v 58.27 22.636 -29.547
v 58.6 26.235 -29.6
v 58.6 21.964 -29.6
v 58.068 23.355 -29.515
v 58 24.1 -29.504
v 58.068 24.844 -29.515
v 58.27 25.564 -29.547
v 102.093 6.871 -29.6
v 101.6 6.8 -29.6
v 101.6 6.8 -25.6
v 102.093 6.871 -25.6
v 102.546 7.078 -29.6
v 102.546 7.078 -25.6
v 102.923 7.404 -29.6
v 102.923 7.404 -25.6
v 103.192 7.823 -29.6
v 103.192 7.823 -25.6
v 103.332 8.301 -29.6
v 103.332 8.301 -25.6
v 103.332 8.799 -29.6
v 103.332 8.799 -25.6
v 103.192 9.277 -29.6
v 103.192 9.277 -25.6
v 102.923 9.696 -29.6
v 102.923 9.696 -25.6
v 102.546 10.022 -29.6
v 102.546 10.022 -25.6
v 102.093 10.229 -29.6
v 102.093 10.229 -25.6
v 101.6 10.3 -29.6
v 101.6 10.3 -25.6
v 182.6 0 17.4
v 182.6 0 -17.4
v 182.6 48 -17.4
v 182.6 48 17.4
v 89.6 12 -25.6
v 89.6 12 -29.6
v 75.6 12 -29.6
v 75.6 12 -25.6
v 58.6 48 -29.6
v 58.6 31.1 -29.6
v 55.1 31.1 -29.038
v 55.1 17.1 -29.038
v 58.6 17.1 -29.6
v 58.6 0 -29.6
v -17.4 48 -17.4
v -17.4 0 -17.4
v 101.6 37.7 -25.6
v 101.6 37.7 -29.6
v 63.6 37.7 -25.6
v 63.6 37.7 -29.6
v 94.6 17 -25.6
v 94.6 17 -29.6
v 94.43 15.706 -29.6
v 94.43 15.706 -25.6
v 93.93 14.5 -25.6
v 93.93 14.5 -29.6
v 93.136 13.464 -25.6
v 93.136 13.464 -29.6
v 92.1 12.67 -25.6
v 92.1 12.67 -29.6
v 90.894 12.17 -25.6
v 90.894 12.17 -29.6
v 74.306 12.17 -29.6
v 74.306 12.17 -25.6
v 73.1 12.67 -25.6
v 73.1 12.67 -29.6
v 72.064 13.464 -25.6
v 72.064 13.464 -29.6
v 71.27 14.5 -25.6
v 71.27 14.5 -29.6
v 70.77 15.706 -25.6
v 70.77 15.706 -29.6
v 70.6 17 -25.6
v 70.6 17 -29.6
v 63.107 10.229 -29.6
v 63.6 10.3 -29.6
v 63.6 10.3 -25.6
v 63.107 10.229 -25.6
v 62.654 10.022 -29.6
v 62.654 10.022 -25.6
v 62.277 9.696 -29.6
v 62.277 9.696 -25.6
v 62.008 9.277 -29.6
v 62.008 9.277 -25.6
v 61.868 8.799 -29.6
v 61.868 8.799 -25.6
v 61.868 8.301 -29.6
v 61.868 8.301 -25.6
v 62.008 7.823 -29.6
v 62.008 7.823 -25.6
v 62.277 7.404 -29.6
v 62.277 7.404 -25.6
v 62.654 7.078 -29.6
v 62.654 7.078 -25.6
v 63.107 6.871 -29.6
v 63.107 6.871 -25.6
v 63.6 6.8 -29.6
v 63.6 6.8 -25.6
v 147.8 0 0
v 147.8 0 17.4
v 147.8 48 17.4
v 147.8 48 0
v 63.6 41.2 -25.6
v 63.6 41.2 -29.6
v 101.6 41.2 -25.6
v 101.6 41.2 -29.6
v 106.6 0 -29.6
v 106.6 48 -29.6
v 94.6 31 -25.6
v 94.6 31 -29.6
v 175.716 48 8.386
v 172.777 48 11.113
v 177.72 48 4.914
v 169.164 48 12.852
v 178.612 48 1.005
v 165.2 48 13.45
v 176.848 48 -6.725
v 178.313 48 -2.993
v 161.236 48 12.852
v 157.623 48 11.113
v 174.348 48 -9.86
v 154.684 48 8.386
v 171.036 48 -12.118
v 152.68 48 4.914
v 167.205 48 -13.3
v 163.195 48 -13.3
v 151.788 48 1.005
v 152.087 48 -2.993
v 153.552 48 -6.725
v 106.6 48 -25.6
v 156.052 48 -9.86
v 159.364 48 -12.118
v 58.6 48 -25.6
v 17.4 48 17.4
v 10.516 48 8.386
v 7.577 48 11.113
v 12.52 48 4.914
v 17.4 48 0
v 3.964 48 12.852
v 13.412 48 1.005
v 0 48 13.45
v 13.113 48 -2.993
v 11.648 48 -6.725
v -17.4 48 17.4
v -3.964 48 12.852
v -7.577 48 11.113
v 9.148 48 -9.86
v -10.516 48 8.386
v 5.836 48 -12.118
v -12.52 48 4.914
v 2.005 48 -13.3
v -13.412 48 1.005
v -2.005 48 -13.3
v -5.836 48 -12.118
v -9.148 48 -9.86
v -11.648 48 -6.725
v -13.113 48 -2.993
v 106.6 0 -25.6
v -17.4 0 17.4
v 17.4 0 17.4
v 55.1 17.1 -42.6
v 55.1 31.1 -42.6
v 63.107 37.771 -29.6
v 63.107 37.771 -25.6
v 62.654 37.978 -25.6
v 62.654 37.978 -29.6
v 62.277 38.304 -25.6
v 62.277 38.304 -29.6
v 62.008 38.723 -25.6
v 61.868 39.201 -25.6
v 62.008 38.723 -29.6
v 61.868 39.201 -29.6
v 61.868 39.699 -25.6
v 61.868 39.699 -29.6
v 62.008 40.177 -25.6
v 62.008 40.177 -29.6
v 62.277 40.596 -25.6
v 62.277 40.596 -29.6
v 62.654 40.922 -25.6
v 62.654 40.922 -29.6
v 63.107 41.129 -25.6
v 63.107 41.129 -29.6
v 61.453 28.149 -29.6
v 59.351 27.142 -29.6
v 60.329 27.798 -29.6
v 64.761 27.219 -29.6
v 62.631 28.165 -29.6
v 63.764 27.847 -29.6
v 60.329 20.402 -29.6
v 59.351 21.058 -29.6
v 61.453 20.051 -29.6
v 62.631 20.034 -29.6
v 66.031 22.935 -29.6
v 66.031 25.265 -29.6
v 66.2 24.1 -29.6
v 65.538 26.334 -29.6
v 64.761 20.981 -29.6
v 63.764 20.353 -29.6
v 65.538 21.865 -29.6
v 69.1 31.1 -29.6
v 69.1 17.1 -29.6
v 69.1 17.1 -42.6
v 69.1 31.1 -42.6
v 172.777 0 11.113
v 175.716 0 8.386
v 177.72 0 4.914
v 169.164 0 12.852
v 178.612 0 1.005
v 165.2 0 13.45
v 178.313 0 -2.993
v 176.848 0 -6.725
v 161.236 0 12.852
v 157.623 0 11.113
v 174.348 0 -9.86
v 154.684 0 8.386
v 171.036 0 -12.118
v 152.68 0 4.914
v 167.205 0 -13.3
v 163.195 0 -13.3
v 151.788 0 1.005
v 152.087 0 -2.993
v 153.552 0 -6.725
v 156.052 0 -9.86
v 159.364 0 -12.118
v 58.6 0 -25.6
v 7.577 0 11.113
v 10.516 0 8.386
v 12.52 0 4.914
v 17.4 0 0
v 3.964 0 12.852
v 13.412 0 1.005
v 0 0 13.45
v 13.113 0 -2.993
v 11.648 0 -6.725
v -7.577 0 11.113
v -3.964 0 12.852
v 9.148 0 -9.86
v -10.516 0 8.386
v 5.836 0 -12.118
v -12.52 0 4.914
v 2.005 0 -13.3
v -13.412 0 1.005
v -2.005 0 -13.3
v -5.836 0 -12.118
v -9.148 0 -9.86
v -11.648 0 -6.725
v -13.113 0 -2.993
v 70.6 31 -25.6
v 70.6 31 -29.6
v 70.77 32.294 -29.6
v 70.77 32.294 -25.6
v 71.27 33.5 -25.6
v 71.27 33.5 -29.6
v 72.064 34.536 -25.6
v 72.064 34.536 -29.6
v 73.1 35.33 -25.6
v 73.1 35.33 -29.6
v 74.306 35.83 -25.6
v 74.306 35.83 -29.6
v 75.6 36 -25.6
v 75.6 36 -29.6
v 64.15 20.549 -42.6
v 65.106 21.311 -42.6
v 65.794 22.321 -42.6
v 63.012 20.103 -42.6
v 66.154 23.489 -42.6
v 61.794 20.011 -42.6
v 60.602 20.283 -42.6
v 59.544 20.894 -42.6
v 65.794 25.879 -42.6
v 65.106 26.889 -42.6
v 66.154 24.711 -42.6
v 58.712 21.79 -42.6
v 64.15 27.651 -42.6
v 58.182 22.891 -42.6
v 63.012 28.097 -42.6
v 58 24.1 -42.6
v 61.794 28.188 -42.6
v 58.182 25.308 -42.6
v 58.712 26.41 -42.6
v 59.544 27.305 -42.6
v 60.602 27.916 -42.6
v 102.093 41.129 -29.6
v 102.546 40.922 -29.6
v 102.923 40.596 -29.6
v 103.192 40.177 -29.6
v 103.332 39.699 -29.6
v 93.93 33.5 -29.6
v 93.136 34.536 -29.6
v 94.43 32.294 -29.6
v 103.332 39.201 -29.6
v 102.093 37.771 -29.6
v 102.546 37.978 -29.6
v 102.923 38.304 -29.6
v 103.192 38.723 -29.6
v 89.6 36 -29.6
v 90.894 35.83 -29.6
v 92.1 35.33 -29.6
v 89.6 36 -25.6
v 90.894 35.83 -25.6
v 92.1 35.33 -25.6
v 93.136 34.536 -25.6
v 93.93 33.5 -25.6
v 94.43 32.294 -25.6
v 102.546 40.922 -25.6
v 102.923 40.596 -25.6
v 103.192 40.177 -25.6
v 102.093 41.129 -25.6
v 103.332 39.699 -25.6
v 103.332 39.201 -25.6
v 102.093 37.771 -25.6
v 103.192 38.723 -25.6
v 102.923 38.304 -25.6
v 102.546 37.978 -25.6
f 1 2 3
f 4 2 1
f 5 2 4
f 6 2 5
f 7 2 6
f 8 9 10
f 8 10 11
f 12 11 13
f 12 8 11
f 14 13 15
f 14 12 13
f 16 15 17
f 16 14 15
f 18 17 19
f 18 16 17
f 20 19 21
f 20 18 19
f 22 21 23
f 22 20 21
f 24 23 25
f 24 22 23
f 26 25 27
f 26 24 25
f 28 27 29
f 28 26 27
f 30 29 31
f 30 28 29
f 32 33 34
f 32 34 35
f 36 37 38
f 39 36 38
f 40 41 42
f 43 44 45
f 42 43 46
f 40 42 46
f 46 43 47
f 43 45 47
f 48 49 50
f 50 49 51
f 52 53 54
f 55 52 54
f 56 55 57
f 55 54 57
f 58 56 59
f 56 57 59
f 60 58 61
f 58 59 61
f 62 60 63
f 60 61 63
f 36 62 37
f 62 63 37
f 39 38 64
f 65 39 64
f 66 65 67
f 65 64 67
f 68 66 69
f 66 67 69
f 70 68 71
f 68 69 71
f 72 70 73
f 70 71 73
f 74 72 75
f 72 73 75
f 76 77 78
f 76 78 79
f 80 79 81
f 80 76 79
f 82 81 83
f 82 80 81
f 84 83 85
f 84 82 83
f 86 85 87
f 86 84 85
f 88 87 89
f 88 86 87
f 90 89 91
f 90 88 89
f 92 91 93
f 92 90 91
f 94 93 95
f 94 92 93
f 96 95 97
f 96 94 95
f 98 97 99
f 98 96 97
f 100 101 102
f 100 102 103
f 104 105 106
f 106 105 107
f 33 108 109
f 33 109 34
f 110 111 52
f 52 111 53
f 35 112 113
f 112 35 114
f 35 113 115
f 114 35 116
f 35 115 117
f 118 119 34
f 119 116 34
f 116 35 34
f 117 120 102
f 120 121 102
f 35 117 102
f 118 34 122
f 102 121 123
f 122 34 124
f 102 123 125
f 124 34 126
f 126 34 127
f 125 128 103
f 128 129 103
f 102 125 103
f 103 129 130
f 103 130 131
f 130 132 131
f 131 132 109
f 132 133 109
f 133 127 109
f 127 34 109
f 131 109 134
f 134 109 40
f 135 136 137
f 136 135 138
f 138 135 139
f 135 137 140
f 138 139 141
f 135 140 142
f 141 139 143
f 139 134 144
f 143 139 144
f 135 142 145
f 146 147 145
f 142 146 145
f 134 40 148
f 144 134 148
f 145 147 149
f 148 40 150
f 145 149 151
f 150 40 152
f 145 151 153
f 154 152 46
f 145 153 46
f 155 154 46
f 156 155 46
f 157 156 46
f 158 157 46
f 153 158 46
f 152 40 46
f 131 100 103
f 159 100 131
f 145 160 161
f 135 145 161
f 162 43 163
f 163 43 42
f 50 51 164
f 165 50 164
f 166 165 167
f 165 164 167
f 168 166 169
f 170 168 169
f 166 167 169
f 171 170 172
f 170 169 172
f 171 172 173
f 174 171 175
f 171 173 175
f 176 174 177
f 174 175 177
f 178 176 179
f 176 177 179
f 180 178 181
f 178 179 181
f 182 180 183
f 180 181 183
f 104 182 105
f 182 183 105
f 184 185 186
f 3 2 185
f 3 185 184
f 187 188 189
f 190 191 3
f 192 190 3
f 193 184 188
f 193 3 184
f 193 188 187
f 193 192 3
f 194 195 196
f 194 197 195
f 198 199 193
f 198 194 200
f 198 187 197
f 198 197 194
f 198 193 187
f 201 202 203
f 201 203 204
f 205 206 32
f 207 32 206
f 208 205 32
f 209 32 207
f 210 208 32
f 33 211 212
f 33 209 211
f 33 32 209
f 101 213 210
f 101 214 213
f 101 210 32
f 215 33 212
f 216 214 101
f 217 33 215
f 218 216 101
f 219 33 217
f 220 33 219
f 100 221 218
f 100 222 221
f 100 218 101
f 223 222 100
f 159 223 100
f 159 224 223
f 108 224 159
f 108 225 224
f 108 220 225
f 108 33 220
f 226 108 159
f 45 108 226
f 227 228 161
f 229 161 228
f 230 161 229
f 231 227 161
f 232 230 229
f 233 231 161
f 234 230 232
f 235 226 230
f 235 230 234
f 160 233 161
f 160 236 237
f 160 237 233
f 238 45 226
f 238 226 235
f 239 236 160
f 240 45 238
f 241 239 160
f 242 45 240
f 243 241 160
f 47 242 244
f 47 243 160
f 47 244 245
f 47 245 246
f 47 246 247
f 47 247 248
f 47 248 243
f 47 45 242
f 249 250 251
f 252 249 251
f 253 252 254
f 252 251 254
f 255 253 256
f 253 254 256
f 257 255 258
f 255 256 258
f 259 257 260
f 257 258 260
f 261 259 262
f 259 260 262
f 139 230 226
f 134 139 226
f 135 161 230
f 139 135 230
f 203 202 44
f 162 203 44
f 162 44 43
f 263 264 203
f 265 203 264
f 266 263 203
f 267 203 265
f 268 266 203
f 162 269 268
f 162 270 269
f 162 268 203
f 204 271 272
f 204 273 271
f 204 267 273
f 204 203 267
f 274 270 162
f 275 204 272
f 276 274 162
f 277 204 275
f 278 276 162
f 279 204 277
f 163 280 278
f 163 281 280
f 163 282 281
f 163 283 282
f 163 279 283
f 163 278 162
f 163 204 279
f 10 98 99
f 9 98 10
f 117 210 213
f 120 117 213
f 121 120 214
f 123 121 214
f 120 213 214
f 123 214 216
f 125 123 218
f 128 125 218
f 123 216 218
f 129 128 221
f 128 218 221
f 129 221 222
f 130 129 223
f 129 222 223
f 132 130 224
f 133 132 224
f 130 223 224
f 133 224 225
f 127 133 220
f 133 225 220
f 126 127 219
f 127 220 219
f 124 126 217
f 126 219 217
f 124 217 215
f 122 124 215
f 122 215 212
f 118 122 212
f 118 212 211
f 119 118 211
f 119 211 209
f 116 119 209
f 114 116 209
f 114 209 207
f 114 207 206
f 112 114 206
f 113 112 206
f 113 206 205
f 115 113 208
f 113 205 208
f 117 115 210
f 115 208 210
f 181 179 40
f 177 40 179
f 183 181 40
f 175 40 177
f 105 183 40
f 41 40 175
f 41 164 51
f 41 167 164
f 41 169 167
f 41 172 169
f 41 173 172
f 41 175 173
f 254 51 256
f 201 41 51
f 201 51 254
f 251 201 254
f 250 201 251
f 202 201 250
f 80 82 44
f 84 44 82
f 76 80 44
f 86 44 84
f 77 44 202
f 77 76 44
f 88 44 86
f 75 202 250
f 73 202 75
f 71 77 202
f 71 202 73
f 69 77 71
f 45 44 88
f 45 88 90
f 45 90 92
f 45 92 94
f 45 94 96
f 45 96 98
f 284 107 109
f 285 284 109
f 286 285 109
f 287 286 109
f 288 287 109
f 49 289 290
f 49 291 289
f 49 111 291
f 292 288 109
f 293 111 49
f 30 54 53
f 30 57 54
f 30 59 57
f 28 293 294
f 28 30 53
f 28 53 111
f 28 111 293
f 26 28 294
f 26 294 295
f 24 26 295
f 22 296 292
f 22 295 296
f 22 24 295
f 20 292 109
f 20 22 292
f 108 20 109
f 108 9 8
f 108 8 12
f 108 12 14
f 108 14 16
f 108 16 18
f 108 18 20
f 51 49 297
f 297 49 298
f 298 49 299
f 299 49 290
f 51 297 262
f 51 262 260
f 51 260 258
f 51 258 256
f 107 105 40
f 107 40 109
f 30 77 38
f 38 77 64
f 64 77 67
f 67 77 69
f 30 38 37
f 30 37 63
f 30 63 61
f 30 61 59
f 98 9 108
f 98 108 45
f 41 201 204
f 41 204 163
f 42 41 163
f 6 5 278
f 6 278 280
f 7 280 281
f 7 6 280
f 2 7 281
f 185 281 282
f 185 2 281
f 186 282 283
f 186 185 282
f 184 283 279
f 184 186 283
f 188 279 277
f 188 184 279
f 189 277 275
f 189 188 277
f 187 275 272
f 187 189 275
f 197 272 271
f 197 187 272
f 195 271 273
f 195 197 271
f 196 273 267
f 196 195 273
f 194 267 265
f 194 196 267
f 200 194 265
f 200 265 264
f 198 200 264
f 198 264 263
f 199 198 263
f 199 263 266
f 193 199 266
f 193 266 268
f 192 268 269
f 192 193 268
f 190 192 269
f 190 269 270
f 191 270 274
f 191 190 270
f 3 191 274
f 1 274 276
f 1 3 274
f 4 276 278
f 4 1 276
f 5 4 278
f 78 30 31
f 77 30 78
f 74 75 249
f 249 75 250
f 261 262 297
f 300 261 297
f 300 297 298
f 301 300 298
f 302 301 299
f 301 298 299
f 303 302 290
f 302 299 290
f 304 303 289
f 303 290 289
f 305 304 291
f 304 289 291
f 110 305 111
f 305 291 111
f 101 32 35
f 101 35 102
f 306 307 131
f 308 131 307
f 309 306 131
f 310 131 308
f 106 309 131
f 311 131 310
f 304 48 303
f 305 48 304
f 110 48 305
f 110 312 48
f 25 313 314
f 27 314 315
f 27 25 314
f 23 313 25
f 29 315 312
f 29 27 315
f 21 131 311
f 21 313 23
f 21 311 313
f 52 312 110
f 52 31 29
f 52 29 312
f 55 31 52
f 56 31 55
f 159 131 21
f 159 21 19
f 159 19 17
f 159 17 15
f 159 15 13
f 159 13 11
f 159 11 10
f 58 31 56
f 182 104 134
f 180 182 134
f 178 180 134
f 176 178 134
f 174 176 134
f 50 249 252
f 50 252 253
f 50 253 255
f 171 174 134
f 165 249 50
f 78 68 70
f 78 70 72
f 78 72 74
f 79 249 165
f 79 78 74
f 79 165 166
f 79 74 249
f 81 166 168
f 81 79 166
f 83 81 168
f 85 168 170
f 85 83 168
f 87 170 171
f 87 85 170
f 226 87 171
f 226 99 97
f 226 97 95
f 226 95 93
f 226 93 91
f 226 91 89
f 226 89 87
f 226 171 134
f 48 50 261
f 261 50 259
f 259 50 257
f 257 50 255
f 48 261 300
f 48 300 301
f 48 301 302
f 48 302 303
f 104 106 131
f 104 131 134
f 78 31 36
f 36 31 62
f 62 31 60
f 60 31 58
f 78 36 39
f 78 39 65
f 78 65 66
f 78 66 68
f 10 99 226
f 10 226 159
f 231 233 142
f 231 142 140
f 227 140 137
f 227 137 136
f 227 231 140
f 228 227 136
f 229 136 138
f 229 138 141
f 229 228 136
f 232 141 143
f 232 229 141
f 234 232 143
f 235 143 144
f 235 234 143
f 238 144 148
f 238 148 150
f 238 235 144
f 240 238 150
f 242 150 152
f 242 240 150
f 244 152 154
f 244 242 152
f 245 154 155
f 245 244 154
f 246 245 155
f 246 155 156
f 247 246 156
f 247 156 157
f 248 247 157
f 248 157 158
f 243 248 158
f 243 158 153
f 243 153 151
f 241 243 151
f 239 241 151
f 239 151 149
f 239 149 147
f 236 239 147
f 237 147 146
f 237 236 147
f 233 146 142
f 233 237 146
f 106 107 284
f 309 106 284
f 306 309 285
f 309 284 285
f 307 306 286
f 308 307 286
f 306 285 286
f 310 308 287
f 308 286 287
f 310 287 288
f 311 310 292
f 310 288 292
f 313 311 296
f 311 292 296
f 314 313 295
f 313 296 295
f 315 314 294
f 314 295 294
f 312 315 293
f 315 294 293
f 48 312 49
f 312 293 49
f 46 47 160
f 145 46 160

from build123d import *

# Parameters (mm, degrees)
SKETCH2_R                = 13.45
BOSS_EXTRUDE1_DEPTH      = 48
CUT_EXTRUDE1_DEPTH       = 10
BOSS_EXTRUDE2_DEPTH      = 13
BOSS_EXTRUDE2_DEPTH_BACK = 2
SKETCH5_W                = 14
SKETCH5_H                = 14
SKETCH5_R                = 4.1


with BuildPart() as part:
    # Sketch2 → Boss-Extrude1 (new body)
    with BuildSketch(Plane(origin=(0, 0, 0), x_dir=(1, 0, 0), z_dir=(0, 1, 0))):
        Polygon((-17.4, -17.4), (17.4, -17.4), (17.4, 0), (58.6, 25.6), (82.6, 25.6), (82.6, 29.6), (58.6, 29.6), (-17.4, 17.4), align=None)
        with Locations(Location((0, 0, 0), (0, 0, 270))):
            Circle(SKETCH2_R, mode=Mode.SUBTRACT)
    boss_extrude1 = extrude(amount=BOSS_EXTRUDE1_DEPTH)

    # Mirror1: Boss-Extrude1 across plane
    add(boss_extrude1.mirror(Plane(origin=(82.6, 0, 0), x_dir=(0, 0, 1), z_dir=(1, 0, 0))))

    # Sketch4 → Cut-Extrude1 (cut)
    with BuildSketch(Plane(origin=(0, 0, -29.6), x_dir=(-1, 0, 0), z_dir=(0, 0, -1))):
        with BuildLine():
            Line((-101.6, 10.3), (-63.6, 10.3))
            ThreePointArc((-63.6, 10.3), (-61.85, 8.55), (-63.6, 6.8))
            Line((-63.6, 6.8), (-101.6, 6.8))
            ThreePointArc((-101.6, 6.8), (-103.35, 8.55), (-101.6, 10.3))
        make_face()
        with BuildLine():
            Line((-101.6, 37.7), (-63.6, 37.7))
            ThreePointArc((-63.6, 37.7), (-61.85, 39.45), (-63.6, 41.2))
            Line((-63.6, 41.2), (-101.6, 41.2))
            ThreePointArc((-101.6, 41.2), (-103.35, 39.45), (-101.6, 37.7))
        make_face()
        with BuildLine():
            Line((-89.6, 12), (-75.6, 12))
            ThreePointArc((-75.6, 12), (-72.064466094, 13.464466094), (-70.6, 17))
            Line((-70.6, 17), (-70.6, 31))
            ThreePointArc((-70.6, 31), (-72.064466094, 34.535533906), (-75.6, 36))
            Line((-75.6, 36), (-89.6, 36))
            ThreePointArc((-89.6, 36), (-93.135533906, 34.535533906), (-94.6, 31))
            Line((-94.6, 31), (-94.6, 17))
            ThreePointArc((-94.6, 17), (-93.135533906, 13.464466094), (-89.6, 12))
        make_face()
    extrude(amount=-CUT_EXTRUDE1_DEPTH, mode=Mode.SUBTRACT)

    # Sketch5 → Boss-Extrude2 (add, two sides: drawn at the far end of the back side and taken through both)
    with BuildSketch(Plane(origin=(0, 0, -29.6), x_dir=(-1, 0, 0), z_dir=(0, 0, -1)).offset(-BOSS_EXTRUDE2_DEPTH_BACK)):
        with Locations((-62.1, 24.09990131)):
            Rectangle(SKETCH5_W, SKETCH5_H)
        with Locations((-62.1, 24.09990131)):
            Circle(SKETCH5_R, mode=Mode.SUBTRACT)
    extrude(amount=BOSS_EXTRUDE2_DEPTH + BOSS_EXTRUDE2_DEPTH_BACK)


solid = part.part
